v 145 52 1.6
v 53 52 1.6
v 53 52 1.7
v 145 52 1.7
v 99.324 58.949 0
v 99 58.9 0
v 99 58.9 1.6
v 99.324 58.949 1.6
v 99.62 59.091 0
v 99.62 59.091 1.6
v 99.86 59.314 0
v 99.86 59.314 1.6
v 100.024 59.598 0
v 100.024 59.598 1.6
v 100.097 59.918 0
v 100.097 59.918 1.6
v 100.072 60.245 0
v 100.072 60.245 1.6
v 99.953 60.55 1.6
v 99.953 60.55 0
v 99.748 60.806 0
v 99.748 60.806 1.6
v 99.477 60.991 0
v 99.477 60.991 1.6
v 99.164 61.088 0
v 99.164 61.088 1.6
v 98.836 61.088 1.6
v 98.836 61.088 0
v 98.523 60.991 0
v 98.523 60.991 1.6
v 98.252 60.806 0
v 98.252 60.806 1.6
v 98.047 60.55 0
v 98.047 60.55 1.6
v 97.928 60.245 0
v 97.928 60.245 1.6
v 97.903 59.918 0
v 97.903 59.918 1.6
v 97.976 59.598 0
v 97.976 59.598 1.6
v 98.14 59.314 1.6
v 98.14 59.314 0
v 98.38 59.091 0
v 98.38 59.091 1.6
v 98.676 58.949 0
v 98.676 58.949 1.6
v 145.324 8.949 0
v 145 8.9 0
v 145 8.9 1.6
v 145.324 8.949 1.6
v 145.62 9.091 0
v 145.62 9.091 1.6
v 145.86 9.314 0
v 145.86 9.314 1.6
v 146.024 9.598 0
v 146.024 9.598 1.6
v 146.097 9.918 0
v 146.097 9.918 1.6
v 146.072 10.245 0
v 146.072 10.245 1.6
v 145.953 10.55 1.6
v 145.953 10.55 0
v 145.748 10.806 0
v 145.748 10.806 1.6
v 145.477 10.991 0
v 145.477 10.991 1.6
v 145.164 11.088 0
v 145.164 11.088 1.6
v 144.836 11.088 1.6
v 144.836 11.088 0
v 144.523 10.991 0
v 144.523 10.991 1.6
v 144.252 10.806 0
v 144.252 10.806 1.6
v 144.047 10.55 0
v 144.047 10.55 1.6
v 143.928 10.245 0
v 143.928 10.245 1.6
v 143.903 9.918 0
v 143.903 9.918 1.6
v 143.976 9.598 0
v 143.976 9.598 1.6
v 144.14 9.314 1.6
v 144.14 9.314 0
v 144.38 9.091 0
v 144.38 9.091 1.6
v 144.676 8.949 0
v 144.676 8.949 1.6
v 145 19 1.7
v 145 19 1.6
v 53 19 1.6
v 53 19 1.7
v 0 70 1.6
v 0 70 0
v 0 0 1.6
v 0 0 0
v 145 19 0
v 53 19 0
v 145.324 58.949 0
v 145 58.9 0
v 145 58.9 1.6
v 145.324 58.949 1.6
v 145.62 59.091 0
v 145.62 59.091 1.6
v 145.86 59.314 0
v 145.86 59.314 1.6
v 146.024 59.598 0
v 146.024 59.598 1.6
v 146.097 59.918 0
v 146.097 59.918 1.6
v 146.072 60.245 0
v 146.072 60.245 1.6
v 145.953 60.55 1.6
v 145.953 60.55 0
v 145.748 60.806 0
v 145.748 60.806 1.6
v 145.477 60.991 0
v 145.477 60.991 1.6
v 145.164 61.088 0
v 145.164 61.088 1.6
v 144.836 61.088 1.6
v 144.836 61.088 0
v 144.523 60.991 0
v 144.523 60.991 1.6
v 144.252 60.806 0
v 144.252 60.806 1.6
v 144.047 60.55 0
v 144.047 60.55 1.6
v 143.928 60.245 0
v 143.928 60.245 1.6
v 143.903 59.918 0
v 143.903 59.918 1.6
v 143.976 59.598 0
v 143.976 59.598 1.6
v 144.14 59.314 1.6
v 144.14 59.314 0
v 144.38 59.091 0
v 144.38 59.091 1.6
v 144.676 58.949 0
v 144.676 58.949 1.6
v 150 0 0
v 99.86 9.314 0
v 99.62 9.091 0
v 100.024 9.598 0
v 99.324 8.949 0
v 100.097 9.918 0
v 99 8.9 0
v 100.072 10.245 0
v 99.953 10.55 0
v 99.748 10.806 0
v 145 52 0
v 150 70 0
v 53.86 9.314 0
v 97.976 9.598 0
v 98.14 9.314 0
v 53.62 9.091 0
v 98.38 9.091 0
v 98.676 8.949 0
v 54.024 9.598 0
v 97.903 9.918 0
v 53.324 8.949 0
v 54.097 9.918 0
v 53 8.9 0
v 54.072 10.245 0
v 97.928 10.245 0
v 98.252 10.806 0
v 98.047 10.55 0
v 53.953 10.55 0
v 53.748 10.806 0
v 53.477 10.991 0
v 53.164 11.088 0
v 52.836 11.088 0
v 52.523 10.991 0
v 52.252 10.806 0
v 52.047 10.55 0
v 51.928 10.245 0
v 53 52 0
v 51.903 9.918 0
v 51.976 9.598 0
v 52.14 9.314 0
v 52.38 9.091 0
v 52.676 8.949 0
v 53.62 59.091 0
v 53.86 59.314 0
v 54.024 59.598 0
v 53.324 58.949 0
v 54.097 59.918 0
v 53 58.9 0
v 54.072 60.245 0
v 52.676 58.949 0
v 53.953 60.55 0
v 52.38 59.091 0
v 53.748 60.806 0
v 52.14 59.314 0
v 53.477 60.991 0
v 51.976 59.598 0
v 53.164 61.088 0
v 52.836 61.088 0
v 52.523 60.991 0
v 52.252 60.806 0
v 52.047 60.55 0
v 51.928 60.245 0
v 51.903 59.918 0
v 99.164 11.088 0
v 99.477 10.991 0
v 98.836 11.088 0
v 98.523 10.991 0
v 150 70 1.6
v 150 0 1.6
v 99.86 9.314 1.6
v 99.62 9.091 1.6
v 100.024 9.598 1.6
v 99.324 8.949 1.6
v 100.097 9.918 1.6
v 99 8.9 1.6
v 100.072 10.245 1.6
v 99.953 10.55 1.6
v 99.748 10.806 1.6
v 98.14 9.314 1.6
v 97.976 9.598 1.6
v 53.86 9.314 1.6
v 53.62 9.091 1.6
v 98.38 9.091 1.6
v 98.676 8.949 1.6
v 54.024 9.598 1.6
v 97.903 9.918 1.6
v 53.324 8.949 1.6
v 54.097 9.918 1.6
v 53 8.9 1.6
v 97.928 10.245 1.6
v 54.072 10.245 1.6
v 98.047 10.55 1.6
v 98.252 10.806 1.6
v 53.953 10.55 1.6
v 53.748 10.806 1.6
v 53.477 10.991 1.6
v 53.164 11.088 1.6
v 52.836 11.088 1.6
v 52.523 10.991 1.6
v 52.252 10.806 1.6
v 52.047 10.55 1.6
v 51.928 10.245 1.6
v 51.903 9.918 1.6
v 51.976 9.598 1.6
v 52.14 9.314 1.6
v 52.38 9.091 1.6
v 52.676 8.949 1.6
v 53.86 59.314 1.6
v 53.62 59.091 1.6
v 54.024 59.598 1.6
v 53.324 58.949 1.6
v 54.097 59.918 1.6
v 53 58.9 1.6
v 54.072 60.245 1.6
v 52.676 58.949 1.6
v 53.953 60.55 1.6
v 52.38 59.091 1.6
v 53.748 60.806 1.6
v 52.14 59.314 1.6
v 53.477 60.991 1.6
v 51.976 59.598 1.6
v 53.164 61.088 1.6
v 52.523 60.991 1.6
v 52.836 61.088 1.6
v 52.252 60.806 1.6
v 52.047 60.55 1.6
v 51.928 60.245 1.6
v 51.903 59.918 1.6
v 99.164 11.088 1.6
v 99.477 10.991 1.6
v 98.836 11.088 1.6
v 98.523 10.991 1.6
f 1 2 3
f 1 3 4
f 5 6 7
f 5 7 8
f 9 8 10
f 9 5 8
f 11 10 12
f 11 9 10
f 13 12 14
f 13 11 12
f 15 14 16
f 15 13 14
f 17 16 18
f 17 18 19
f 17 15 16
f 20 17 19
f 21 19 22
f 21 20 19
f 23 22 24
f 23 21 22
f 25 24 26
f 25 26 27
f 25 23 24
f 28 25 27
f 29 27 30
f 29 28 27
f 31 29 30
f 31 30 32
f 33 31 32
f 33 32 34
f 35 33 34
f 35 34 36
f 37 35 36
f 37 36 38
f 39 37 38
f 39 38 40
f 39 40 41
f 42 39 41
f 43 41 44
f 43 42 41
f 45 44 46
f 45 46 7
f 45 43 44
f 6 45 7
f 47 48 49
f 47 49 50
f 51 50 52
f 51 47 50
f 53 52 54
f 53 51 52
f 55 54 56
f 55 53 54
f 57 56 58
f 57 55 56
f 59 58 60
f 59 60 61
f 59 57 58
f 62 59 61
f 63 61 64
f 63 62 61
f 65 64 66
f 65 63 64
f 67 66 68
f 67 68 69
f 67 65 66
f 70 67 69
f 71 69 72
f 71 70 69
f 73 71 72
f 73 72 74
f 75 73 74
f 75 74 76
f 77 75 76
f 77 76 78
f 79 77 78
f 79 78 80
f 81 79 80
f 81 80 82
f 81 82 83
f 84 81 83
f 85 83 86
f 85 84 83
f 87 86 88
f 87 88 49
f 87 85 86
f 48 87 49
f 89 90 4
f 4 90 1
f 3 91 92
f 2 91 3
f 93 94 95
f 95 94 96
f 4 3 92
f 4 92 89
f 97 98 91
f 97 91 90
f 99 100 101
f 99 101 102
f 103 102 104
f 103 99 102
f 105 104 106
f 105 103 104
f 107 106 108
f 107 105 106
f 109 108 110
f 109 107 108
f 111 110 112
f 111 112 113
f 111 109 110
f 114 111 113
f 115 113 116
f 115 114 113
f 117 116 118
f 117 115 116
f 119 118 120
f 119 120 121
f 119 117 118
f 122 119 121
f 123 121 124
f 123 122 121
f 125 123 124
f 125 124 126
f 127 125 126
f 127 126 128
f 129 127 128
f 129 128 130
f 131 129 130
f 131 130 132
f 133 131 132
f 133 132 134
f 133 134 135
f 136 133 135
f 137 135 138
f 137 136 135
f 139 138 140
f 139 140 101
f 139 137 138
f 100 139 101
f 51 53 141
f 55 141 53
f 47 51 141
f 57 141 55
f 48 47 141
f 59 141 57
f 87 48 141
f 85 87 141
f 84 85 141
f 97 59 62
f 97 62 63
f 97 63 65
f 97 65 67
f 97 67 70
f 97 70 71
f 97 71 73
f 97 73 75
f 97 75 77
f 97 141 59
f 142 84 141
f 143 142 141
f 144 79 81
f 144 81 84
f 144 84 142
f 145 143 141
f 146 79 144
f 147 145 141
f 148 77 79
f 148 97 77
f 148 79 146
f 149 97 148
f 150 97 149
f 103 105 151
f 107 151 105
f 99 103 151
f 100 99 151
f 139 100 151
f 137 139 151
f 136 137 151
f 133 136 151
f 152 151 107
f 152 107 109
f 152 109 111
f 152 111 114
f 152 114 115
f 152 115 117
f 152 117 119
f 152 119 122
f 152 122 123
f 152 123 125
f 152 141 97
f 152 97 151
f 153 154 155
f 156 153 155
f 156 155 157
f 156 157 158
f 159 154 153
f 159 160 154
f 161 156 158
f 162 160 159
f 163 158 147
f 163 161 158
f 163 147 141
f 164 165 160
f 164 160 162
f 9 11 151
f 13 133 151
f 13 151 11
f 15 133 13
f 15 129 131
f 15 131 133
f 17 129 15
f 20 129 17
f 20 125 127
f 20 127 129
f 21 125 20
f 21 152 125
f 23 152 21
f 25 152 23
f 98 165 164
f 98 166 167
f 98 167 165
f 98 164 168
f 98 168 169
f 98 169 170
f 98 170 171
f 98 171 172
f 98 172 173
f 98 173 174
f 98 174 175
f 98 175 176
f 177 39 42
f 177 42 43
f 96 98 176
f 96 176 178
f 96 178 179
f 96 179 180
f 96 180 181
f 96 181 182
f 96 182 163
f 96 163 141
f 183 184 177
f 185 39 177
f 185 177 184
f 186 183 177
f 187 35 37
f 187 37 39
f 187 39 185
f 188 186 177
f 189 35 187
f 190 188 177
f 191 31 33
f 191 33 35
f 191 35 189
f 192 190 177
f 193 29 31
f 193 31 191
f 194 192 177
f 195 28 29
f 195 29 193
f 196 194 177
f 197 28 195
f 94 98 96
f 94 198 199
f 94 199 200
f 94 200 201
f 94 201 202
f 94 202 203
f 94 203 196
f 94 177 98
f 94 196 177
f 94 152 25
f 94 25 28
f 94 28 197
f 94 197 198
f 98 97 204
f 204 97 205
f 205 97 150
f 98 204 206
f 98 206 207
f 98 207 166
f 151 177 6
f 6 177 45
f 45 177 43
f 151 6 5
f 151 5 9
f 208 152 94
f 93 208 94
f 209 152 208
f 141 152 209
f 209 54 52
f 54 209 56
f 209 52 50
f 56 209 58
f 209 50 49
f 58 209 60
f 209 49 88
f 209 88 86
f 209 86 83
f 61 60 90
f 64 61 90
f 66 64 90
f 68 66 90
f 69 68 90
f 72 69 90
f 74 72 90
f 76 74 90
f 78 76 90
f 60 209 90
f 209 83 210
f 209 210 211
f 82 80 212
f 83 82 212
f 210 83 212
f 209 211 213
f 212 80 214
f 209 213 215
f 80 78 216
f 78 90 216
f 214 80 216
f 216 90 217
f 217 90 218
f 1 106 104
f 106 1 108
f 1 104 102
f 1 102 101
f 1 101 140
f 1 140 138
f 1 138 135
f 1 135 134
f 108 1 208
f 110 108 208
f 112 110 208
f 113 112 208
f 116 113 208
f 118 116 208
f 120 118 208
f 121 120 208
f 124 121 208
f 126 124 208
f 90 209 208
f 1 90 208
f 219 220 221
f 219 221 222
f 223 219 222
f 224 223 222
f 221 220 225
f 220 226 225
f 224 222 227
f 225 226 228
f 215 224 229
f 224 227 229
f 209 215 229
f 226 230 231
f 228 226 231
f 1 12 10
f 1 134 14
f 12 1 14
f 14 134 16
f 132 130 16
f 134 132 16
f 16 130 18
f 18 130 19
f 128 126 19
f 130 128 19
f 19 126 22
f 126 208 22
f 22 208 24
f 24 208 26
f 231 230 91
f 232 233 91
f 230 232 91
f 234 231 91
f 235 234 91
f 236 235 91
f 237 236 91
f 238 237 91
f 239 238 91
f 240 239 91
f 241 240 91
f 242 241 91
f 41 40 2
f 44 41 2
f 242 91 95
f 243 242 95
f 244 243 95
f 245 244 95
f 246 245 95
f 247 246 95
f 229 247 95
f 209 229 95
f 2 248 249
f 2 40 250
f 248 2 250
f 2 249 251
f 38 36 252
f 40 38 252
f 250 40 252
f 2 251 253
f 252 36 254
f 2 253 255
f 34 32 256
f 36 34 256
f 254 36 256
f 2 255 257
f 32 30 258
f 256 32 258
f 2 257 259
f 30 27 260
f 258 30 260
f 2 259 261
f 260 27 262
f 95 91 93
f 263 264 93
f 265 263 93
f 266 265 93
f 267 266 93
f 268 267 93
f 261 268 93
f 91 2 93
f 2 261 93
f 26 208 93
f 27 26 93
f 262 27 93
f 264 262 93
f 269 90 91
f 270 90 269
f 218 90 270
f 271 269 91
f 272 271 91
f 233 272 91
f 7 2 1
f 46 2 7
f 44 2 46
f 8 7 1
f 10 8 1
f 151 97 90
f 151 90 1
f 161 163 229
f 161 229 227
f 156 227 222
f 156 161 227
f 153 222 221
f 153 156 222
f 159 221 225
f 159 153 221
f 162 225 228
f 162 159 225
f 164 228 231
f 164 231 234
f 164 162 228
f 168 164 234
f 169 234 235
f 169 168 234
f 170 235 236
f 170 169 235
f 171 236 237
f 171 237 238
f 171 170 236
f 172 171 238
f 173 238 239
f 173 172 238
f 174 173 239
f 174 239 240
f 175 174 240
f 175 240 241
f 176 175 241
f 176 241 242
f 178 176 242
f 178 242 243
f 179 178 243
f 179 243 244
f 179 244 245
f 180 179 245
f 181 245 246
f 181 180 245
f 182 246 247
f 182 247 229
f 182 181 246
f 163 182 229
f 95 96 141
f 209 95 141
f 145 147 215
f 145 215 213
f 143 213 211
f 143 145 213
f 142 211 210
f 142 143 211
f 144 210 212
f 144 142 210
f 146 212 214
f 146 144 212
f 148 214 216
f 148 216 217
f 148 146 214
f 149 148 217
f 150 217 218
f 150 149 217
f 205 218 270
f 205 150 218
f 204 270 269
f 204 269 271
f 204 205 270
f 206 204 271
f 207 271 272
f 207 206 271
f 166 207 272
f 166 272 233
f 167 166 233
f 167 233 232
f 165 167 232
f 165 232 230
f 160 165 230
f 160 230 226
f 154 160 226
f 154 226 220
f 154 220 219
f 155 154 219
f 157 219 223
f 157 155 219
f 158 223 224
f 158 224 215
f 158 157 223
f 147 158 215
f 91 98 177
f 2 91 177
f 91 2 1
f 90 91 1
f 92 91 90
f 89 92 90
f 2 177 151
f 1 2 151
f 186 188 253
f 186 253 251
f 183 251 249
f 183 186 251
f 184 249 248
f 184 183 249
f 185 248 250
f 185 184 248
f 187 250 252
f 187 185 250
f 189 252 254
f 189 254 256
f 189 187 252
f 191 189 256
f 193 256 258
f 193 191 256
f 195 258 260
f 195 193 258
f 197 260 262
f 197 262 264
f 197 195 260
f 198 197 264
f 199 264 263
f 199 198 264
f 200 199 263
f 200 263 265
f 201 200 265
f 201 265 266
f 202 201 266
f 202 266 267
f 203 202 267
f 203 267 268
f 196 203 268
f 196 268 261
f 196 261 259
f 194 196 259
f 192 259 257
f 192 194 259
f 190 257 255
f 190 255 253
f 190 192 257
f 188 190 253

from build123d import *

# Parameters (mm, degrees)
SKETCH1_W           = 92
SKETCH1_H           = 33
BOSS_EXTRUDE1_DEPTH = 1.6
SKETCH2_W           = 92
SKETCH2_H           = 33
BOSS_EXTRUDE2_DEPTH = 0.1


with BuildPart() as part:
    # Sketch1 → Boss-Extrude1 (new body)
    with BuildSketch(Plane.XY):
        Polygon((48, 70), (150, 70), (150, 0), (48, 0), (46, 0), (0, 0), (0, 18.6), (0, 36), (0, 47), (0, 70), align=None)
        with Locations((99, 35.5)):
            Rectangle(SKETCH1_W, SKETCH1_H, mode=Mode.SUBTRACT)
        with BuildLine():
            ThreePointArc((99, 11.1), (97.9, 10), (99, 8.9))
            ThreePointArc((99, 8.9), (100.1, 10), (99, 11.1))
        make_face(mode=Mode.SUBTRACT)
        with BuildLine():
            ThreePointArc((99, 61.1), (97.9, 60), (99, 58.9))
            ThreePointArc((99, 58.9), (100.1, 60), (99, 61.1))
        make_face(mode=Mode.SUBTRACT)
        with BuildLine():
            ThreePointArc((53, 61.1), (51.9, 60), (53, 58.9))
            ThreePointArc((53, 58.9), (54.1, 60), (53, 61.1))
        make_face(mode=Mode.SUBTRACT)
        with BuildLine():
            ThreePointArc((53, 11.1), (51.9, 10), (53, 8.9))
            ThreePointArc((53, 8.9), (54.1, 10), (53, 11.1))
        make_face(mode=Mode.SUBTRACT)
        with BuildLine():
            ThreePointArc((145, 11.1), (143.9, 10), (145, 8.9))
            ThreePointArc((145, 8.9), (146.1, 10), (145, 11.1))
        make_face(mode=Mode.SUBTRACT)
        with BuildLine():
            ThreePointArc((145, 61.1), (143.9, 60), (145, 58.9))
            ThreePointArc((145, 58.9), (146.1, 60), (145, 61.1))
        make_face(mode=Mode.SUBTRACT)
    extrude(amount=BOSS_EXTRUDE1_DEPTH)


with BuildPart() as body_2:
    # Sketch2 → Boss-Extrude2 (new body)
    with BuildSketch(Plane.XY.offset(1.6)):
        with Locations((99, 35.5)):
            Rectangle(SKETCH2_W, SKETCH2_H)
    extrude(amount=BOSS_EXTRUDE2_DEPTH)


solid = Compound([part.part, body_2.part])
